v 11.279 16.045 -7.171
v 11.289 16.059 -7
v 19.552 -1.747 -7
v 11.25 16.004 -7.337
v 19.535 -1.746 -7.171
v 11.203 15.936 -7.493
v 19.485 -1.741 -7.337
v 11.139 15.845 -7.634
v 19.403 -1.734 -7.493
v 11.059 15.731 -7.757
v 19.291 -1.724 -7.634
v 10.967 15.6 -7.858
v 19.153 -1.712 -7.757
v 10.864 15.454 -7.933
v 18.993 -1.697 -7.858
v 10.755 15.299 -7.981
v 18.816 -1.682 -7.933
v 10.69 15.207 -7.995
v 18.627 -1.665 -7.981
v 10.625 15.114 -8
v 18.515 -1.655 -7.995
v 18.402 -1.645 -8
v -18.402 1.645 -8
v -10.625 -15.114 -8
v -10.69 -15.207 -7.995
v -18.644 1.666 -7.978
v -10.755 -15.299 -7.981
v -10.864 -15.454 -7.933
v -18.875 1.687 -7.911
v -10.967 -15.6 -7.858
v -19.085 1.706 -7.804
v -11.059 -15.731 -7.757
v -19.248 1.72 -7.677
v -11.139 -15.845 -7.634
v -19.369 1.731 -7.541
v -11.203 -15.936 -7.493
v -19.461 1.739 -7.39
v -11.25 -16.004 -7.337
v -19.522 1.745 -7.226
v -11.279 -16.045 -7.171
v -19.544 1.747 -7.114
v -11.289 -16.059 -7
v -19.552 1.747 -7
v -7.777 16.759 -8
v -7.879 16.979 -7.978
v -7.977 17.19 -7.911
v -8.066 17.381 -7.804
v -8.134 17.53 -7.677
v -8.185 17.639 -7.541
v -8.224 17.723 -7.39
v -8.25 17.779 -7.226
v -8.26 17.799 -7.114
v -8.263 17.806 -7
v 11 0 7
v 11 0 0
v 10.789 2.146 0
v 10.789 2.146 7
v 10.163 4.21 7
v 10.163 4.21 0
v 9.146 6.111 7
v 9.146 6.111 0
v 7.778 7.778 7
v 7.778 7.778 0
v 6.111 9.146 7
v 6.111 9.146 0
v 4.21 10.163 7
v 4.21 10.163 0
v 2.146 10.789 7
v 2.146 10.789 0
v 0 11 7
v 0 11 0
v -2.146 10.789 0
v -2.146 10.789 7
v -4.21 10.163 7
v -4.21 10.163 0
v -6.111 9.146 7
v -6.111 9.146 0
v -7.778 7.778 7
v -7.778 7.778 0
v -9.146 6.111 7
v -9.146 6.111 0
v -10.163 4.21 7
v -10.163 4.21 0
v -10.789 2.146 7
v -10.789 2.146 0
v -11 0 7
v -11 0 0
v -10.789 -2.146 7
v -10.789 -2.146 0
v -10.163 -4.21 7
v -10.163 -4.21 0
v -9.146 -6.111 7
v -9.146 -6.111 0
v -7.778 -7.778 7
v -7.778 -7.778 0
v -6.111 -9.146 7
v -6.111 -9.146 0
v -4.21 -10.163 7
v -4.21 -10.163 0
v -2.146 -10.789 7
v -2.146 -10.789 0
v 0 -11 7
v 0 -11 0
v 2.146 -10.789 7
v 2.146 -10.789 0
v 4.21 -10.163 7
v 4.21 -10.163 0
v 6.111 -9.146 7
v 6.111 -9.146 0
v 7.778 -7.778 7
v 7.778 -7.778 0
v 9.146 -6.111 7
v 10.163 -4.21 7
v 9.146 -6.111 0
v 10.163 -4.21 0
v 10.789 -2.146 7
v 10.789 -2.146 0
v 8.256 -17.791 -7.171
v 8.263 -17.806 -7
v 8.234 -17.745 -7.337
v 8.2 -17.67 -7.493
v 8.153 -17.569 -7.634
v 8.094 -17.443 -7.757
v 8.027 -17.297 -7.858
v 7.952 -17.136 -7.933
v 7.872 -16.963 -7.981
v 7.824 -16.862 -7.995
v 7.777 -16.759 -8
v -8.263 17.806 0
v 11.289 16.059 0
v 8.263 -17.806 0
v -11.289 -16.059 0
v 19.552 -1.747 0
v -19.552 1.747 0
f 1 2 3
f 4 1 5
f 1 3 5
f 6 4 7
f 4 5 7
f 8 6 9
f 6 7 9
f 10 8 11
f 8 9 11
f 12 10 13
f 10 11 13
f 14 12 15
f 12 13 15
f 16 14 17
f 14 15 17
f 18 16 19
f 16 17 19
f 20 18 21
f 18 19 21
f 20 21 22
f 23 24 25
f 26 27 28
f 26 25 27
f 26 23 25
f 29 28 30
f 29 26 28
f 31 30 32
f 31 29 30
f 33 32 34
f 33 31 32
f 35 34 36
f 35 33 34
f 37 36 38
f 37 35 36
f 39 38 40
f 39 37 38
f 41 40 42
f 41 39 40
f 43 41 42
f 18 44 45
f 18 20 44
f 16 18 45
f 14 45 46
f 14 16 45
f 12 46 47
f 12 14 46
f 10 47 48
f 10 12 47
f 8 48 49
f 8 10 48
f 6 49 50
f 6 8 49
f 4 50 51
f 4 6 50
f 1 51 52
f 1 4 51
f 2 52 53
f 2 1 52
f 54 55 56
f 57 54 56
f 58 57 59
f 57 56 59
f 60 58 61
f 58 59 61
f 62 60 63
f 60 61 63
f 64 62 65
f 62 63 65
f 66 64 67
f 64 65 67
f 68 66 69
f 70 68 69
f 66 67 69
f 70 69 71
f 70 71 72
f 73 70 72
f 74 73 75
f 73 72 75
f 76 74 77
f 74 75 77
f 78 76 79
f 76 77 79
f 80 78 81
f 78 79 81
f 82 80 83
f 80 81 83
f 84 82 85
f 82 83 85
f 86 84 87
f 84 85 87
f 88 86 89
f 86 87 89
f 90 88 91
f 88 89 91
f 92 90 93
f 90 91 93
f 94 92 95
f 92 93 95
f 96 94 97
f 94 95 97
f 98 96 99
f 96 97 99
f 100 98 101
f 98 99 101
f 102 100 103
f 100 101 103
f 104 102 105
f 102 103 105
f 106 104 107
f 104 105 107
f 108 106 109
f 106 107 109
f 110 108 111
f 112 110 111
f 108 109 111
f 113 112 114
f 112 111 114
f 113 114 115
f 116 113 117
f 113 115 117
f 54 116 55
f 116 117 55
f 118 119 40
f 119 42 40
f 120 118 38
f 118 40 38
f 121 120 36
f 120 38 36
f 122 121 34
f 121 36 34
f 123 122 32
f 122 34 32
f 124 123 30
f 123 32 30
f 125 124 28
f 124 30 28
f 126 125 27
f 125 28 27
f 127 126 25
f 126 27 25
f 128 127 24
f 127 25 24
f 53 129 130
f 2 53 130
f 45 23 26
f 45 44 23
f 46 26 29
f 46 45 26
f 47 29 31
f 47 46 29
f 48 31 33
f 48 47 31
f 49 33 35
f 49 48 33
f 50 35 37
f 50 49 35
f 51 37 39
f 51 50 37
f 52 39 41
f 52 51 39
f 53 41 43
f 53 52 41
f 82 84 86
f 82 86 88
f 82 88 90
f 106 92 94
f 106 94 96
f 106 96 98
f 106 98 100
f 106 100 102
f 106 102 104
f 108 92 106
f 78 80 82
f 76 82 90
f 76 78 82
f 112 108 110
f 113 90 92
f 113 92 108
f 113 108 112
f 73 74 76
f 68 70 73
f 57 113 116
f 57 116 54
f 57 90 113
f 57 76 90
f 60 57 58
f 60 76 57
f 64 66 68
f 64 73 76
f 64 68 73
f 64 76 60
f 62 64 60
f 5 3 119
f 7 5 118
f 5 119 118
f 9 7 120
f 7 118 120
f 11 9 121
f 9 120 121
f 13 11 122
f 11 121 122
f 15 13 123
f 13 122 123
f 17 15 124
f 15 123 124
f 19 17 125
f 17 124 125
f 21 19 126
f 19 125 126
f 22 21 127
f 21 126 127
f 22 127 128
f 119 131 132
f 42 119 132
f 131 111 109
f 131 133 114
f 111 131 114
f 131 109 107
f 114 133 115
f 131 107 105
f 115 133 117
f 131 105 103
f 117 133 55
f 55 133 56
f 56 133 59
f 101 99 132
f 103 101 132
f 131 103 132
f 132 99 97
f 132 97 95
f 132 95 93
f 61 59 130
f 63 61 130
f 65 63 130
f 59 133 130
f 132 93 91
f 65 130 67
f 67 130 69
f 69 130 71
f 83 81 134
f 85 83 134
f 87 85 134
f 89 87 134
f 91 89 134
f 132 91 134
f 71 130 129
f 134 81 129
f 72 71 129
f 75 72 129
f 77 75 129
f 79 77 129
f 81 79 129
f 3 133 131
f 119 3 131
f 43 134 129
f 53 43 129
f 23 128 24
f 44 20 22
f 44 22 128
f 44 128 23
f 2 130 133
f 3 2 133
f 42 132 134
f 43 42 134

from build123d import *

# Parameters (mm, degrees)
SCHIZZO1_R                   = 11
ESTRUSIONE_ESTRUSIONE1_DEPTH = 7
ESTRUSIONE_ESTRUSIONE2_DEPTH = 8
RACCORDO1_R                  = 1


with BuildPart() as part:
    # Schizzo1 → Estrusione-Estrusione1 (new body)
    with BuildSketch(Plane.XY):
        Circle(SCHIZZO1_R)
    extrude(amount=ESTRUSIONE_ESTRUSIONE1_DEPTH)

    # Schizzo2 → Estrusione-Estrusione2 (add)
    with BuildSketch(Plane(origin=(0, 0, 0), x_dir=(-1, 0, 0), z_dir=(0, 0, -1))):
        Polygon((-19.551988484, -1.747306402), (-8.26278251, -17.806171922), (11.289205974, -16.058865521), (19.551988484, 1.747306402), (8.26278251, 17.806171922), (-11.289205974, 16.058865521), align=None)
    extrude(amount=ESTRUSIONE_ESTRUSIONE2_DEPTH)

    # Raccordo1
    raccordo1_edges = [part.edges().sort_by_distance(p)[0] for p in [
        (15.420597229, 7.155779559, -8),
        (13.907385497, -9.776739162, -8),
        (-1.513211732, -16.932518721, -8),
        (-15.420597229, -7.155779559, -8),
        (-13.907385497, 9.776739162, -8),
        (1.513211732, 16.932518721, -8),
    ]]
    fillet(raccordo1_edges, radius=RACCORDO1_R)


solid = part.part
